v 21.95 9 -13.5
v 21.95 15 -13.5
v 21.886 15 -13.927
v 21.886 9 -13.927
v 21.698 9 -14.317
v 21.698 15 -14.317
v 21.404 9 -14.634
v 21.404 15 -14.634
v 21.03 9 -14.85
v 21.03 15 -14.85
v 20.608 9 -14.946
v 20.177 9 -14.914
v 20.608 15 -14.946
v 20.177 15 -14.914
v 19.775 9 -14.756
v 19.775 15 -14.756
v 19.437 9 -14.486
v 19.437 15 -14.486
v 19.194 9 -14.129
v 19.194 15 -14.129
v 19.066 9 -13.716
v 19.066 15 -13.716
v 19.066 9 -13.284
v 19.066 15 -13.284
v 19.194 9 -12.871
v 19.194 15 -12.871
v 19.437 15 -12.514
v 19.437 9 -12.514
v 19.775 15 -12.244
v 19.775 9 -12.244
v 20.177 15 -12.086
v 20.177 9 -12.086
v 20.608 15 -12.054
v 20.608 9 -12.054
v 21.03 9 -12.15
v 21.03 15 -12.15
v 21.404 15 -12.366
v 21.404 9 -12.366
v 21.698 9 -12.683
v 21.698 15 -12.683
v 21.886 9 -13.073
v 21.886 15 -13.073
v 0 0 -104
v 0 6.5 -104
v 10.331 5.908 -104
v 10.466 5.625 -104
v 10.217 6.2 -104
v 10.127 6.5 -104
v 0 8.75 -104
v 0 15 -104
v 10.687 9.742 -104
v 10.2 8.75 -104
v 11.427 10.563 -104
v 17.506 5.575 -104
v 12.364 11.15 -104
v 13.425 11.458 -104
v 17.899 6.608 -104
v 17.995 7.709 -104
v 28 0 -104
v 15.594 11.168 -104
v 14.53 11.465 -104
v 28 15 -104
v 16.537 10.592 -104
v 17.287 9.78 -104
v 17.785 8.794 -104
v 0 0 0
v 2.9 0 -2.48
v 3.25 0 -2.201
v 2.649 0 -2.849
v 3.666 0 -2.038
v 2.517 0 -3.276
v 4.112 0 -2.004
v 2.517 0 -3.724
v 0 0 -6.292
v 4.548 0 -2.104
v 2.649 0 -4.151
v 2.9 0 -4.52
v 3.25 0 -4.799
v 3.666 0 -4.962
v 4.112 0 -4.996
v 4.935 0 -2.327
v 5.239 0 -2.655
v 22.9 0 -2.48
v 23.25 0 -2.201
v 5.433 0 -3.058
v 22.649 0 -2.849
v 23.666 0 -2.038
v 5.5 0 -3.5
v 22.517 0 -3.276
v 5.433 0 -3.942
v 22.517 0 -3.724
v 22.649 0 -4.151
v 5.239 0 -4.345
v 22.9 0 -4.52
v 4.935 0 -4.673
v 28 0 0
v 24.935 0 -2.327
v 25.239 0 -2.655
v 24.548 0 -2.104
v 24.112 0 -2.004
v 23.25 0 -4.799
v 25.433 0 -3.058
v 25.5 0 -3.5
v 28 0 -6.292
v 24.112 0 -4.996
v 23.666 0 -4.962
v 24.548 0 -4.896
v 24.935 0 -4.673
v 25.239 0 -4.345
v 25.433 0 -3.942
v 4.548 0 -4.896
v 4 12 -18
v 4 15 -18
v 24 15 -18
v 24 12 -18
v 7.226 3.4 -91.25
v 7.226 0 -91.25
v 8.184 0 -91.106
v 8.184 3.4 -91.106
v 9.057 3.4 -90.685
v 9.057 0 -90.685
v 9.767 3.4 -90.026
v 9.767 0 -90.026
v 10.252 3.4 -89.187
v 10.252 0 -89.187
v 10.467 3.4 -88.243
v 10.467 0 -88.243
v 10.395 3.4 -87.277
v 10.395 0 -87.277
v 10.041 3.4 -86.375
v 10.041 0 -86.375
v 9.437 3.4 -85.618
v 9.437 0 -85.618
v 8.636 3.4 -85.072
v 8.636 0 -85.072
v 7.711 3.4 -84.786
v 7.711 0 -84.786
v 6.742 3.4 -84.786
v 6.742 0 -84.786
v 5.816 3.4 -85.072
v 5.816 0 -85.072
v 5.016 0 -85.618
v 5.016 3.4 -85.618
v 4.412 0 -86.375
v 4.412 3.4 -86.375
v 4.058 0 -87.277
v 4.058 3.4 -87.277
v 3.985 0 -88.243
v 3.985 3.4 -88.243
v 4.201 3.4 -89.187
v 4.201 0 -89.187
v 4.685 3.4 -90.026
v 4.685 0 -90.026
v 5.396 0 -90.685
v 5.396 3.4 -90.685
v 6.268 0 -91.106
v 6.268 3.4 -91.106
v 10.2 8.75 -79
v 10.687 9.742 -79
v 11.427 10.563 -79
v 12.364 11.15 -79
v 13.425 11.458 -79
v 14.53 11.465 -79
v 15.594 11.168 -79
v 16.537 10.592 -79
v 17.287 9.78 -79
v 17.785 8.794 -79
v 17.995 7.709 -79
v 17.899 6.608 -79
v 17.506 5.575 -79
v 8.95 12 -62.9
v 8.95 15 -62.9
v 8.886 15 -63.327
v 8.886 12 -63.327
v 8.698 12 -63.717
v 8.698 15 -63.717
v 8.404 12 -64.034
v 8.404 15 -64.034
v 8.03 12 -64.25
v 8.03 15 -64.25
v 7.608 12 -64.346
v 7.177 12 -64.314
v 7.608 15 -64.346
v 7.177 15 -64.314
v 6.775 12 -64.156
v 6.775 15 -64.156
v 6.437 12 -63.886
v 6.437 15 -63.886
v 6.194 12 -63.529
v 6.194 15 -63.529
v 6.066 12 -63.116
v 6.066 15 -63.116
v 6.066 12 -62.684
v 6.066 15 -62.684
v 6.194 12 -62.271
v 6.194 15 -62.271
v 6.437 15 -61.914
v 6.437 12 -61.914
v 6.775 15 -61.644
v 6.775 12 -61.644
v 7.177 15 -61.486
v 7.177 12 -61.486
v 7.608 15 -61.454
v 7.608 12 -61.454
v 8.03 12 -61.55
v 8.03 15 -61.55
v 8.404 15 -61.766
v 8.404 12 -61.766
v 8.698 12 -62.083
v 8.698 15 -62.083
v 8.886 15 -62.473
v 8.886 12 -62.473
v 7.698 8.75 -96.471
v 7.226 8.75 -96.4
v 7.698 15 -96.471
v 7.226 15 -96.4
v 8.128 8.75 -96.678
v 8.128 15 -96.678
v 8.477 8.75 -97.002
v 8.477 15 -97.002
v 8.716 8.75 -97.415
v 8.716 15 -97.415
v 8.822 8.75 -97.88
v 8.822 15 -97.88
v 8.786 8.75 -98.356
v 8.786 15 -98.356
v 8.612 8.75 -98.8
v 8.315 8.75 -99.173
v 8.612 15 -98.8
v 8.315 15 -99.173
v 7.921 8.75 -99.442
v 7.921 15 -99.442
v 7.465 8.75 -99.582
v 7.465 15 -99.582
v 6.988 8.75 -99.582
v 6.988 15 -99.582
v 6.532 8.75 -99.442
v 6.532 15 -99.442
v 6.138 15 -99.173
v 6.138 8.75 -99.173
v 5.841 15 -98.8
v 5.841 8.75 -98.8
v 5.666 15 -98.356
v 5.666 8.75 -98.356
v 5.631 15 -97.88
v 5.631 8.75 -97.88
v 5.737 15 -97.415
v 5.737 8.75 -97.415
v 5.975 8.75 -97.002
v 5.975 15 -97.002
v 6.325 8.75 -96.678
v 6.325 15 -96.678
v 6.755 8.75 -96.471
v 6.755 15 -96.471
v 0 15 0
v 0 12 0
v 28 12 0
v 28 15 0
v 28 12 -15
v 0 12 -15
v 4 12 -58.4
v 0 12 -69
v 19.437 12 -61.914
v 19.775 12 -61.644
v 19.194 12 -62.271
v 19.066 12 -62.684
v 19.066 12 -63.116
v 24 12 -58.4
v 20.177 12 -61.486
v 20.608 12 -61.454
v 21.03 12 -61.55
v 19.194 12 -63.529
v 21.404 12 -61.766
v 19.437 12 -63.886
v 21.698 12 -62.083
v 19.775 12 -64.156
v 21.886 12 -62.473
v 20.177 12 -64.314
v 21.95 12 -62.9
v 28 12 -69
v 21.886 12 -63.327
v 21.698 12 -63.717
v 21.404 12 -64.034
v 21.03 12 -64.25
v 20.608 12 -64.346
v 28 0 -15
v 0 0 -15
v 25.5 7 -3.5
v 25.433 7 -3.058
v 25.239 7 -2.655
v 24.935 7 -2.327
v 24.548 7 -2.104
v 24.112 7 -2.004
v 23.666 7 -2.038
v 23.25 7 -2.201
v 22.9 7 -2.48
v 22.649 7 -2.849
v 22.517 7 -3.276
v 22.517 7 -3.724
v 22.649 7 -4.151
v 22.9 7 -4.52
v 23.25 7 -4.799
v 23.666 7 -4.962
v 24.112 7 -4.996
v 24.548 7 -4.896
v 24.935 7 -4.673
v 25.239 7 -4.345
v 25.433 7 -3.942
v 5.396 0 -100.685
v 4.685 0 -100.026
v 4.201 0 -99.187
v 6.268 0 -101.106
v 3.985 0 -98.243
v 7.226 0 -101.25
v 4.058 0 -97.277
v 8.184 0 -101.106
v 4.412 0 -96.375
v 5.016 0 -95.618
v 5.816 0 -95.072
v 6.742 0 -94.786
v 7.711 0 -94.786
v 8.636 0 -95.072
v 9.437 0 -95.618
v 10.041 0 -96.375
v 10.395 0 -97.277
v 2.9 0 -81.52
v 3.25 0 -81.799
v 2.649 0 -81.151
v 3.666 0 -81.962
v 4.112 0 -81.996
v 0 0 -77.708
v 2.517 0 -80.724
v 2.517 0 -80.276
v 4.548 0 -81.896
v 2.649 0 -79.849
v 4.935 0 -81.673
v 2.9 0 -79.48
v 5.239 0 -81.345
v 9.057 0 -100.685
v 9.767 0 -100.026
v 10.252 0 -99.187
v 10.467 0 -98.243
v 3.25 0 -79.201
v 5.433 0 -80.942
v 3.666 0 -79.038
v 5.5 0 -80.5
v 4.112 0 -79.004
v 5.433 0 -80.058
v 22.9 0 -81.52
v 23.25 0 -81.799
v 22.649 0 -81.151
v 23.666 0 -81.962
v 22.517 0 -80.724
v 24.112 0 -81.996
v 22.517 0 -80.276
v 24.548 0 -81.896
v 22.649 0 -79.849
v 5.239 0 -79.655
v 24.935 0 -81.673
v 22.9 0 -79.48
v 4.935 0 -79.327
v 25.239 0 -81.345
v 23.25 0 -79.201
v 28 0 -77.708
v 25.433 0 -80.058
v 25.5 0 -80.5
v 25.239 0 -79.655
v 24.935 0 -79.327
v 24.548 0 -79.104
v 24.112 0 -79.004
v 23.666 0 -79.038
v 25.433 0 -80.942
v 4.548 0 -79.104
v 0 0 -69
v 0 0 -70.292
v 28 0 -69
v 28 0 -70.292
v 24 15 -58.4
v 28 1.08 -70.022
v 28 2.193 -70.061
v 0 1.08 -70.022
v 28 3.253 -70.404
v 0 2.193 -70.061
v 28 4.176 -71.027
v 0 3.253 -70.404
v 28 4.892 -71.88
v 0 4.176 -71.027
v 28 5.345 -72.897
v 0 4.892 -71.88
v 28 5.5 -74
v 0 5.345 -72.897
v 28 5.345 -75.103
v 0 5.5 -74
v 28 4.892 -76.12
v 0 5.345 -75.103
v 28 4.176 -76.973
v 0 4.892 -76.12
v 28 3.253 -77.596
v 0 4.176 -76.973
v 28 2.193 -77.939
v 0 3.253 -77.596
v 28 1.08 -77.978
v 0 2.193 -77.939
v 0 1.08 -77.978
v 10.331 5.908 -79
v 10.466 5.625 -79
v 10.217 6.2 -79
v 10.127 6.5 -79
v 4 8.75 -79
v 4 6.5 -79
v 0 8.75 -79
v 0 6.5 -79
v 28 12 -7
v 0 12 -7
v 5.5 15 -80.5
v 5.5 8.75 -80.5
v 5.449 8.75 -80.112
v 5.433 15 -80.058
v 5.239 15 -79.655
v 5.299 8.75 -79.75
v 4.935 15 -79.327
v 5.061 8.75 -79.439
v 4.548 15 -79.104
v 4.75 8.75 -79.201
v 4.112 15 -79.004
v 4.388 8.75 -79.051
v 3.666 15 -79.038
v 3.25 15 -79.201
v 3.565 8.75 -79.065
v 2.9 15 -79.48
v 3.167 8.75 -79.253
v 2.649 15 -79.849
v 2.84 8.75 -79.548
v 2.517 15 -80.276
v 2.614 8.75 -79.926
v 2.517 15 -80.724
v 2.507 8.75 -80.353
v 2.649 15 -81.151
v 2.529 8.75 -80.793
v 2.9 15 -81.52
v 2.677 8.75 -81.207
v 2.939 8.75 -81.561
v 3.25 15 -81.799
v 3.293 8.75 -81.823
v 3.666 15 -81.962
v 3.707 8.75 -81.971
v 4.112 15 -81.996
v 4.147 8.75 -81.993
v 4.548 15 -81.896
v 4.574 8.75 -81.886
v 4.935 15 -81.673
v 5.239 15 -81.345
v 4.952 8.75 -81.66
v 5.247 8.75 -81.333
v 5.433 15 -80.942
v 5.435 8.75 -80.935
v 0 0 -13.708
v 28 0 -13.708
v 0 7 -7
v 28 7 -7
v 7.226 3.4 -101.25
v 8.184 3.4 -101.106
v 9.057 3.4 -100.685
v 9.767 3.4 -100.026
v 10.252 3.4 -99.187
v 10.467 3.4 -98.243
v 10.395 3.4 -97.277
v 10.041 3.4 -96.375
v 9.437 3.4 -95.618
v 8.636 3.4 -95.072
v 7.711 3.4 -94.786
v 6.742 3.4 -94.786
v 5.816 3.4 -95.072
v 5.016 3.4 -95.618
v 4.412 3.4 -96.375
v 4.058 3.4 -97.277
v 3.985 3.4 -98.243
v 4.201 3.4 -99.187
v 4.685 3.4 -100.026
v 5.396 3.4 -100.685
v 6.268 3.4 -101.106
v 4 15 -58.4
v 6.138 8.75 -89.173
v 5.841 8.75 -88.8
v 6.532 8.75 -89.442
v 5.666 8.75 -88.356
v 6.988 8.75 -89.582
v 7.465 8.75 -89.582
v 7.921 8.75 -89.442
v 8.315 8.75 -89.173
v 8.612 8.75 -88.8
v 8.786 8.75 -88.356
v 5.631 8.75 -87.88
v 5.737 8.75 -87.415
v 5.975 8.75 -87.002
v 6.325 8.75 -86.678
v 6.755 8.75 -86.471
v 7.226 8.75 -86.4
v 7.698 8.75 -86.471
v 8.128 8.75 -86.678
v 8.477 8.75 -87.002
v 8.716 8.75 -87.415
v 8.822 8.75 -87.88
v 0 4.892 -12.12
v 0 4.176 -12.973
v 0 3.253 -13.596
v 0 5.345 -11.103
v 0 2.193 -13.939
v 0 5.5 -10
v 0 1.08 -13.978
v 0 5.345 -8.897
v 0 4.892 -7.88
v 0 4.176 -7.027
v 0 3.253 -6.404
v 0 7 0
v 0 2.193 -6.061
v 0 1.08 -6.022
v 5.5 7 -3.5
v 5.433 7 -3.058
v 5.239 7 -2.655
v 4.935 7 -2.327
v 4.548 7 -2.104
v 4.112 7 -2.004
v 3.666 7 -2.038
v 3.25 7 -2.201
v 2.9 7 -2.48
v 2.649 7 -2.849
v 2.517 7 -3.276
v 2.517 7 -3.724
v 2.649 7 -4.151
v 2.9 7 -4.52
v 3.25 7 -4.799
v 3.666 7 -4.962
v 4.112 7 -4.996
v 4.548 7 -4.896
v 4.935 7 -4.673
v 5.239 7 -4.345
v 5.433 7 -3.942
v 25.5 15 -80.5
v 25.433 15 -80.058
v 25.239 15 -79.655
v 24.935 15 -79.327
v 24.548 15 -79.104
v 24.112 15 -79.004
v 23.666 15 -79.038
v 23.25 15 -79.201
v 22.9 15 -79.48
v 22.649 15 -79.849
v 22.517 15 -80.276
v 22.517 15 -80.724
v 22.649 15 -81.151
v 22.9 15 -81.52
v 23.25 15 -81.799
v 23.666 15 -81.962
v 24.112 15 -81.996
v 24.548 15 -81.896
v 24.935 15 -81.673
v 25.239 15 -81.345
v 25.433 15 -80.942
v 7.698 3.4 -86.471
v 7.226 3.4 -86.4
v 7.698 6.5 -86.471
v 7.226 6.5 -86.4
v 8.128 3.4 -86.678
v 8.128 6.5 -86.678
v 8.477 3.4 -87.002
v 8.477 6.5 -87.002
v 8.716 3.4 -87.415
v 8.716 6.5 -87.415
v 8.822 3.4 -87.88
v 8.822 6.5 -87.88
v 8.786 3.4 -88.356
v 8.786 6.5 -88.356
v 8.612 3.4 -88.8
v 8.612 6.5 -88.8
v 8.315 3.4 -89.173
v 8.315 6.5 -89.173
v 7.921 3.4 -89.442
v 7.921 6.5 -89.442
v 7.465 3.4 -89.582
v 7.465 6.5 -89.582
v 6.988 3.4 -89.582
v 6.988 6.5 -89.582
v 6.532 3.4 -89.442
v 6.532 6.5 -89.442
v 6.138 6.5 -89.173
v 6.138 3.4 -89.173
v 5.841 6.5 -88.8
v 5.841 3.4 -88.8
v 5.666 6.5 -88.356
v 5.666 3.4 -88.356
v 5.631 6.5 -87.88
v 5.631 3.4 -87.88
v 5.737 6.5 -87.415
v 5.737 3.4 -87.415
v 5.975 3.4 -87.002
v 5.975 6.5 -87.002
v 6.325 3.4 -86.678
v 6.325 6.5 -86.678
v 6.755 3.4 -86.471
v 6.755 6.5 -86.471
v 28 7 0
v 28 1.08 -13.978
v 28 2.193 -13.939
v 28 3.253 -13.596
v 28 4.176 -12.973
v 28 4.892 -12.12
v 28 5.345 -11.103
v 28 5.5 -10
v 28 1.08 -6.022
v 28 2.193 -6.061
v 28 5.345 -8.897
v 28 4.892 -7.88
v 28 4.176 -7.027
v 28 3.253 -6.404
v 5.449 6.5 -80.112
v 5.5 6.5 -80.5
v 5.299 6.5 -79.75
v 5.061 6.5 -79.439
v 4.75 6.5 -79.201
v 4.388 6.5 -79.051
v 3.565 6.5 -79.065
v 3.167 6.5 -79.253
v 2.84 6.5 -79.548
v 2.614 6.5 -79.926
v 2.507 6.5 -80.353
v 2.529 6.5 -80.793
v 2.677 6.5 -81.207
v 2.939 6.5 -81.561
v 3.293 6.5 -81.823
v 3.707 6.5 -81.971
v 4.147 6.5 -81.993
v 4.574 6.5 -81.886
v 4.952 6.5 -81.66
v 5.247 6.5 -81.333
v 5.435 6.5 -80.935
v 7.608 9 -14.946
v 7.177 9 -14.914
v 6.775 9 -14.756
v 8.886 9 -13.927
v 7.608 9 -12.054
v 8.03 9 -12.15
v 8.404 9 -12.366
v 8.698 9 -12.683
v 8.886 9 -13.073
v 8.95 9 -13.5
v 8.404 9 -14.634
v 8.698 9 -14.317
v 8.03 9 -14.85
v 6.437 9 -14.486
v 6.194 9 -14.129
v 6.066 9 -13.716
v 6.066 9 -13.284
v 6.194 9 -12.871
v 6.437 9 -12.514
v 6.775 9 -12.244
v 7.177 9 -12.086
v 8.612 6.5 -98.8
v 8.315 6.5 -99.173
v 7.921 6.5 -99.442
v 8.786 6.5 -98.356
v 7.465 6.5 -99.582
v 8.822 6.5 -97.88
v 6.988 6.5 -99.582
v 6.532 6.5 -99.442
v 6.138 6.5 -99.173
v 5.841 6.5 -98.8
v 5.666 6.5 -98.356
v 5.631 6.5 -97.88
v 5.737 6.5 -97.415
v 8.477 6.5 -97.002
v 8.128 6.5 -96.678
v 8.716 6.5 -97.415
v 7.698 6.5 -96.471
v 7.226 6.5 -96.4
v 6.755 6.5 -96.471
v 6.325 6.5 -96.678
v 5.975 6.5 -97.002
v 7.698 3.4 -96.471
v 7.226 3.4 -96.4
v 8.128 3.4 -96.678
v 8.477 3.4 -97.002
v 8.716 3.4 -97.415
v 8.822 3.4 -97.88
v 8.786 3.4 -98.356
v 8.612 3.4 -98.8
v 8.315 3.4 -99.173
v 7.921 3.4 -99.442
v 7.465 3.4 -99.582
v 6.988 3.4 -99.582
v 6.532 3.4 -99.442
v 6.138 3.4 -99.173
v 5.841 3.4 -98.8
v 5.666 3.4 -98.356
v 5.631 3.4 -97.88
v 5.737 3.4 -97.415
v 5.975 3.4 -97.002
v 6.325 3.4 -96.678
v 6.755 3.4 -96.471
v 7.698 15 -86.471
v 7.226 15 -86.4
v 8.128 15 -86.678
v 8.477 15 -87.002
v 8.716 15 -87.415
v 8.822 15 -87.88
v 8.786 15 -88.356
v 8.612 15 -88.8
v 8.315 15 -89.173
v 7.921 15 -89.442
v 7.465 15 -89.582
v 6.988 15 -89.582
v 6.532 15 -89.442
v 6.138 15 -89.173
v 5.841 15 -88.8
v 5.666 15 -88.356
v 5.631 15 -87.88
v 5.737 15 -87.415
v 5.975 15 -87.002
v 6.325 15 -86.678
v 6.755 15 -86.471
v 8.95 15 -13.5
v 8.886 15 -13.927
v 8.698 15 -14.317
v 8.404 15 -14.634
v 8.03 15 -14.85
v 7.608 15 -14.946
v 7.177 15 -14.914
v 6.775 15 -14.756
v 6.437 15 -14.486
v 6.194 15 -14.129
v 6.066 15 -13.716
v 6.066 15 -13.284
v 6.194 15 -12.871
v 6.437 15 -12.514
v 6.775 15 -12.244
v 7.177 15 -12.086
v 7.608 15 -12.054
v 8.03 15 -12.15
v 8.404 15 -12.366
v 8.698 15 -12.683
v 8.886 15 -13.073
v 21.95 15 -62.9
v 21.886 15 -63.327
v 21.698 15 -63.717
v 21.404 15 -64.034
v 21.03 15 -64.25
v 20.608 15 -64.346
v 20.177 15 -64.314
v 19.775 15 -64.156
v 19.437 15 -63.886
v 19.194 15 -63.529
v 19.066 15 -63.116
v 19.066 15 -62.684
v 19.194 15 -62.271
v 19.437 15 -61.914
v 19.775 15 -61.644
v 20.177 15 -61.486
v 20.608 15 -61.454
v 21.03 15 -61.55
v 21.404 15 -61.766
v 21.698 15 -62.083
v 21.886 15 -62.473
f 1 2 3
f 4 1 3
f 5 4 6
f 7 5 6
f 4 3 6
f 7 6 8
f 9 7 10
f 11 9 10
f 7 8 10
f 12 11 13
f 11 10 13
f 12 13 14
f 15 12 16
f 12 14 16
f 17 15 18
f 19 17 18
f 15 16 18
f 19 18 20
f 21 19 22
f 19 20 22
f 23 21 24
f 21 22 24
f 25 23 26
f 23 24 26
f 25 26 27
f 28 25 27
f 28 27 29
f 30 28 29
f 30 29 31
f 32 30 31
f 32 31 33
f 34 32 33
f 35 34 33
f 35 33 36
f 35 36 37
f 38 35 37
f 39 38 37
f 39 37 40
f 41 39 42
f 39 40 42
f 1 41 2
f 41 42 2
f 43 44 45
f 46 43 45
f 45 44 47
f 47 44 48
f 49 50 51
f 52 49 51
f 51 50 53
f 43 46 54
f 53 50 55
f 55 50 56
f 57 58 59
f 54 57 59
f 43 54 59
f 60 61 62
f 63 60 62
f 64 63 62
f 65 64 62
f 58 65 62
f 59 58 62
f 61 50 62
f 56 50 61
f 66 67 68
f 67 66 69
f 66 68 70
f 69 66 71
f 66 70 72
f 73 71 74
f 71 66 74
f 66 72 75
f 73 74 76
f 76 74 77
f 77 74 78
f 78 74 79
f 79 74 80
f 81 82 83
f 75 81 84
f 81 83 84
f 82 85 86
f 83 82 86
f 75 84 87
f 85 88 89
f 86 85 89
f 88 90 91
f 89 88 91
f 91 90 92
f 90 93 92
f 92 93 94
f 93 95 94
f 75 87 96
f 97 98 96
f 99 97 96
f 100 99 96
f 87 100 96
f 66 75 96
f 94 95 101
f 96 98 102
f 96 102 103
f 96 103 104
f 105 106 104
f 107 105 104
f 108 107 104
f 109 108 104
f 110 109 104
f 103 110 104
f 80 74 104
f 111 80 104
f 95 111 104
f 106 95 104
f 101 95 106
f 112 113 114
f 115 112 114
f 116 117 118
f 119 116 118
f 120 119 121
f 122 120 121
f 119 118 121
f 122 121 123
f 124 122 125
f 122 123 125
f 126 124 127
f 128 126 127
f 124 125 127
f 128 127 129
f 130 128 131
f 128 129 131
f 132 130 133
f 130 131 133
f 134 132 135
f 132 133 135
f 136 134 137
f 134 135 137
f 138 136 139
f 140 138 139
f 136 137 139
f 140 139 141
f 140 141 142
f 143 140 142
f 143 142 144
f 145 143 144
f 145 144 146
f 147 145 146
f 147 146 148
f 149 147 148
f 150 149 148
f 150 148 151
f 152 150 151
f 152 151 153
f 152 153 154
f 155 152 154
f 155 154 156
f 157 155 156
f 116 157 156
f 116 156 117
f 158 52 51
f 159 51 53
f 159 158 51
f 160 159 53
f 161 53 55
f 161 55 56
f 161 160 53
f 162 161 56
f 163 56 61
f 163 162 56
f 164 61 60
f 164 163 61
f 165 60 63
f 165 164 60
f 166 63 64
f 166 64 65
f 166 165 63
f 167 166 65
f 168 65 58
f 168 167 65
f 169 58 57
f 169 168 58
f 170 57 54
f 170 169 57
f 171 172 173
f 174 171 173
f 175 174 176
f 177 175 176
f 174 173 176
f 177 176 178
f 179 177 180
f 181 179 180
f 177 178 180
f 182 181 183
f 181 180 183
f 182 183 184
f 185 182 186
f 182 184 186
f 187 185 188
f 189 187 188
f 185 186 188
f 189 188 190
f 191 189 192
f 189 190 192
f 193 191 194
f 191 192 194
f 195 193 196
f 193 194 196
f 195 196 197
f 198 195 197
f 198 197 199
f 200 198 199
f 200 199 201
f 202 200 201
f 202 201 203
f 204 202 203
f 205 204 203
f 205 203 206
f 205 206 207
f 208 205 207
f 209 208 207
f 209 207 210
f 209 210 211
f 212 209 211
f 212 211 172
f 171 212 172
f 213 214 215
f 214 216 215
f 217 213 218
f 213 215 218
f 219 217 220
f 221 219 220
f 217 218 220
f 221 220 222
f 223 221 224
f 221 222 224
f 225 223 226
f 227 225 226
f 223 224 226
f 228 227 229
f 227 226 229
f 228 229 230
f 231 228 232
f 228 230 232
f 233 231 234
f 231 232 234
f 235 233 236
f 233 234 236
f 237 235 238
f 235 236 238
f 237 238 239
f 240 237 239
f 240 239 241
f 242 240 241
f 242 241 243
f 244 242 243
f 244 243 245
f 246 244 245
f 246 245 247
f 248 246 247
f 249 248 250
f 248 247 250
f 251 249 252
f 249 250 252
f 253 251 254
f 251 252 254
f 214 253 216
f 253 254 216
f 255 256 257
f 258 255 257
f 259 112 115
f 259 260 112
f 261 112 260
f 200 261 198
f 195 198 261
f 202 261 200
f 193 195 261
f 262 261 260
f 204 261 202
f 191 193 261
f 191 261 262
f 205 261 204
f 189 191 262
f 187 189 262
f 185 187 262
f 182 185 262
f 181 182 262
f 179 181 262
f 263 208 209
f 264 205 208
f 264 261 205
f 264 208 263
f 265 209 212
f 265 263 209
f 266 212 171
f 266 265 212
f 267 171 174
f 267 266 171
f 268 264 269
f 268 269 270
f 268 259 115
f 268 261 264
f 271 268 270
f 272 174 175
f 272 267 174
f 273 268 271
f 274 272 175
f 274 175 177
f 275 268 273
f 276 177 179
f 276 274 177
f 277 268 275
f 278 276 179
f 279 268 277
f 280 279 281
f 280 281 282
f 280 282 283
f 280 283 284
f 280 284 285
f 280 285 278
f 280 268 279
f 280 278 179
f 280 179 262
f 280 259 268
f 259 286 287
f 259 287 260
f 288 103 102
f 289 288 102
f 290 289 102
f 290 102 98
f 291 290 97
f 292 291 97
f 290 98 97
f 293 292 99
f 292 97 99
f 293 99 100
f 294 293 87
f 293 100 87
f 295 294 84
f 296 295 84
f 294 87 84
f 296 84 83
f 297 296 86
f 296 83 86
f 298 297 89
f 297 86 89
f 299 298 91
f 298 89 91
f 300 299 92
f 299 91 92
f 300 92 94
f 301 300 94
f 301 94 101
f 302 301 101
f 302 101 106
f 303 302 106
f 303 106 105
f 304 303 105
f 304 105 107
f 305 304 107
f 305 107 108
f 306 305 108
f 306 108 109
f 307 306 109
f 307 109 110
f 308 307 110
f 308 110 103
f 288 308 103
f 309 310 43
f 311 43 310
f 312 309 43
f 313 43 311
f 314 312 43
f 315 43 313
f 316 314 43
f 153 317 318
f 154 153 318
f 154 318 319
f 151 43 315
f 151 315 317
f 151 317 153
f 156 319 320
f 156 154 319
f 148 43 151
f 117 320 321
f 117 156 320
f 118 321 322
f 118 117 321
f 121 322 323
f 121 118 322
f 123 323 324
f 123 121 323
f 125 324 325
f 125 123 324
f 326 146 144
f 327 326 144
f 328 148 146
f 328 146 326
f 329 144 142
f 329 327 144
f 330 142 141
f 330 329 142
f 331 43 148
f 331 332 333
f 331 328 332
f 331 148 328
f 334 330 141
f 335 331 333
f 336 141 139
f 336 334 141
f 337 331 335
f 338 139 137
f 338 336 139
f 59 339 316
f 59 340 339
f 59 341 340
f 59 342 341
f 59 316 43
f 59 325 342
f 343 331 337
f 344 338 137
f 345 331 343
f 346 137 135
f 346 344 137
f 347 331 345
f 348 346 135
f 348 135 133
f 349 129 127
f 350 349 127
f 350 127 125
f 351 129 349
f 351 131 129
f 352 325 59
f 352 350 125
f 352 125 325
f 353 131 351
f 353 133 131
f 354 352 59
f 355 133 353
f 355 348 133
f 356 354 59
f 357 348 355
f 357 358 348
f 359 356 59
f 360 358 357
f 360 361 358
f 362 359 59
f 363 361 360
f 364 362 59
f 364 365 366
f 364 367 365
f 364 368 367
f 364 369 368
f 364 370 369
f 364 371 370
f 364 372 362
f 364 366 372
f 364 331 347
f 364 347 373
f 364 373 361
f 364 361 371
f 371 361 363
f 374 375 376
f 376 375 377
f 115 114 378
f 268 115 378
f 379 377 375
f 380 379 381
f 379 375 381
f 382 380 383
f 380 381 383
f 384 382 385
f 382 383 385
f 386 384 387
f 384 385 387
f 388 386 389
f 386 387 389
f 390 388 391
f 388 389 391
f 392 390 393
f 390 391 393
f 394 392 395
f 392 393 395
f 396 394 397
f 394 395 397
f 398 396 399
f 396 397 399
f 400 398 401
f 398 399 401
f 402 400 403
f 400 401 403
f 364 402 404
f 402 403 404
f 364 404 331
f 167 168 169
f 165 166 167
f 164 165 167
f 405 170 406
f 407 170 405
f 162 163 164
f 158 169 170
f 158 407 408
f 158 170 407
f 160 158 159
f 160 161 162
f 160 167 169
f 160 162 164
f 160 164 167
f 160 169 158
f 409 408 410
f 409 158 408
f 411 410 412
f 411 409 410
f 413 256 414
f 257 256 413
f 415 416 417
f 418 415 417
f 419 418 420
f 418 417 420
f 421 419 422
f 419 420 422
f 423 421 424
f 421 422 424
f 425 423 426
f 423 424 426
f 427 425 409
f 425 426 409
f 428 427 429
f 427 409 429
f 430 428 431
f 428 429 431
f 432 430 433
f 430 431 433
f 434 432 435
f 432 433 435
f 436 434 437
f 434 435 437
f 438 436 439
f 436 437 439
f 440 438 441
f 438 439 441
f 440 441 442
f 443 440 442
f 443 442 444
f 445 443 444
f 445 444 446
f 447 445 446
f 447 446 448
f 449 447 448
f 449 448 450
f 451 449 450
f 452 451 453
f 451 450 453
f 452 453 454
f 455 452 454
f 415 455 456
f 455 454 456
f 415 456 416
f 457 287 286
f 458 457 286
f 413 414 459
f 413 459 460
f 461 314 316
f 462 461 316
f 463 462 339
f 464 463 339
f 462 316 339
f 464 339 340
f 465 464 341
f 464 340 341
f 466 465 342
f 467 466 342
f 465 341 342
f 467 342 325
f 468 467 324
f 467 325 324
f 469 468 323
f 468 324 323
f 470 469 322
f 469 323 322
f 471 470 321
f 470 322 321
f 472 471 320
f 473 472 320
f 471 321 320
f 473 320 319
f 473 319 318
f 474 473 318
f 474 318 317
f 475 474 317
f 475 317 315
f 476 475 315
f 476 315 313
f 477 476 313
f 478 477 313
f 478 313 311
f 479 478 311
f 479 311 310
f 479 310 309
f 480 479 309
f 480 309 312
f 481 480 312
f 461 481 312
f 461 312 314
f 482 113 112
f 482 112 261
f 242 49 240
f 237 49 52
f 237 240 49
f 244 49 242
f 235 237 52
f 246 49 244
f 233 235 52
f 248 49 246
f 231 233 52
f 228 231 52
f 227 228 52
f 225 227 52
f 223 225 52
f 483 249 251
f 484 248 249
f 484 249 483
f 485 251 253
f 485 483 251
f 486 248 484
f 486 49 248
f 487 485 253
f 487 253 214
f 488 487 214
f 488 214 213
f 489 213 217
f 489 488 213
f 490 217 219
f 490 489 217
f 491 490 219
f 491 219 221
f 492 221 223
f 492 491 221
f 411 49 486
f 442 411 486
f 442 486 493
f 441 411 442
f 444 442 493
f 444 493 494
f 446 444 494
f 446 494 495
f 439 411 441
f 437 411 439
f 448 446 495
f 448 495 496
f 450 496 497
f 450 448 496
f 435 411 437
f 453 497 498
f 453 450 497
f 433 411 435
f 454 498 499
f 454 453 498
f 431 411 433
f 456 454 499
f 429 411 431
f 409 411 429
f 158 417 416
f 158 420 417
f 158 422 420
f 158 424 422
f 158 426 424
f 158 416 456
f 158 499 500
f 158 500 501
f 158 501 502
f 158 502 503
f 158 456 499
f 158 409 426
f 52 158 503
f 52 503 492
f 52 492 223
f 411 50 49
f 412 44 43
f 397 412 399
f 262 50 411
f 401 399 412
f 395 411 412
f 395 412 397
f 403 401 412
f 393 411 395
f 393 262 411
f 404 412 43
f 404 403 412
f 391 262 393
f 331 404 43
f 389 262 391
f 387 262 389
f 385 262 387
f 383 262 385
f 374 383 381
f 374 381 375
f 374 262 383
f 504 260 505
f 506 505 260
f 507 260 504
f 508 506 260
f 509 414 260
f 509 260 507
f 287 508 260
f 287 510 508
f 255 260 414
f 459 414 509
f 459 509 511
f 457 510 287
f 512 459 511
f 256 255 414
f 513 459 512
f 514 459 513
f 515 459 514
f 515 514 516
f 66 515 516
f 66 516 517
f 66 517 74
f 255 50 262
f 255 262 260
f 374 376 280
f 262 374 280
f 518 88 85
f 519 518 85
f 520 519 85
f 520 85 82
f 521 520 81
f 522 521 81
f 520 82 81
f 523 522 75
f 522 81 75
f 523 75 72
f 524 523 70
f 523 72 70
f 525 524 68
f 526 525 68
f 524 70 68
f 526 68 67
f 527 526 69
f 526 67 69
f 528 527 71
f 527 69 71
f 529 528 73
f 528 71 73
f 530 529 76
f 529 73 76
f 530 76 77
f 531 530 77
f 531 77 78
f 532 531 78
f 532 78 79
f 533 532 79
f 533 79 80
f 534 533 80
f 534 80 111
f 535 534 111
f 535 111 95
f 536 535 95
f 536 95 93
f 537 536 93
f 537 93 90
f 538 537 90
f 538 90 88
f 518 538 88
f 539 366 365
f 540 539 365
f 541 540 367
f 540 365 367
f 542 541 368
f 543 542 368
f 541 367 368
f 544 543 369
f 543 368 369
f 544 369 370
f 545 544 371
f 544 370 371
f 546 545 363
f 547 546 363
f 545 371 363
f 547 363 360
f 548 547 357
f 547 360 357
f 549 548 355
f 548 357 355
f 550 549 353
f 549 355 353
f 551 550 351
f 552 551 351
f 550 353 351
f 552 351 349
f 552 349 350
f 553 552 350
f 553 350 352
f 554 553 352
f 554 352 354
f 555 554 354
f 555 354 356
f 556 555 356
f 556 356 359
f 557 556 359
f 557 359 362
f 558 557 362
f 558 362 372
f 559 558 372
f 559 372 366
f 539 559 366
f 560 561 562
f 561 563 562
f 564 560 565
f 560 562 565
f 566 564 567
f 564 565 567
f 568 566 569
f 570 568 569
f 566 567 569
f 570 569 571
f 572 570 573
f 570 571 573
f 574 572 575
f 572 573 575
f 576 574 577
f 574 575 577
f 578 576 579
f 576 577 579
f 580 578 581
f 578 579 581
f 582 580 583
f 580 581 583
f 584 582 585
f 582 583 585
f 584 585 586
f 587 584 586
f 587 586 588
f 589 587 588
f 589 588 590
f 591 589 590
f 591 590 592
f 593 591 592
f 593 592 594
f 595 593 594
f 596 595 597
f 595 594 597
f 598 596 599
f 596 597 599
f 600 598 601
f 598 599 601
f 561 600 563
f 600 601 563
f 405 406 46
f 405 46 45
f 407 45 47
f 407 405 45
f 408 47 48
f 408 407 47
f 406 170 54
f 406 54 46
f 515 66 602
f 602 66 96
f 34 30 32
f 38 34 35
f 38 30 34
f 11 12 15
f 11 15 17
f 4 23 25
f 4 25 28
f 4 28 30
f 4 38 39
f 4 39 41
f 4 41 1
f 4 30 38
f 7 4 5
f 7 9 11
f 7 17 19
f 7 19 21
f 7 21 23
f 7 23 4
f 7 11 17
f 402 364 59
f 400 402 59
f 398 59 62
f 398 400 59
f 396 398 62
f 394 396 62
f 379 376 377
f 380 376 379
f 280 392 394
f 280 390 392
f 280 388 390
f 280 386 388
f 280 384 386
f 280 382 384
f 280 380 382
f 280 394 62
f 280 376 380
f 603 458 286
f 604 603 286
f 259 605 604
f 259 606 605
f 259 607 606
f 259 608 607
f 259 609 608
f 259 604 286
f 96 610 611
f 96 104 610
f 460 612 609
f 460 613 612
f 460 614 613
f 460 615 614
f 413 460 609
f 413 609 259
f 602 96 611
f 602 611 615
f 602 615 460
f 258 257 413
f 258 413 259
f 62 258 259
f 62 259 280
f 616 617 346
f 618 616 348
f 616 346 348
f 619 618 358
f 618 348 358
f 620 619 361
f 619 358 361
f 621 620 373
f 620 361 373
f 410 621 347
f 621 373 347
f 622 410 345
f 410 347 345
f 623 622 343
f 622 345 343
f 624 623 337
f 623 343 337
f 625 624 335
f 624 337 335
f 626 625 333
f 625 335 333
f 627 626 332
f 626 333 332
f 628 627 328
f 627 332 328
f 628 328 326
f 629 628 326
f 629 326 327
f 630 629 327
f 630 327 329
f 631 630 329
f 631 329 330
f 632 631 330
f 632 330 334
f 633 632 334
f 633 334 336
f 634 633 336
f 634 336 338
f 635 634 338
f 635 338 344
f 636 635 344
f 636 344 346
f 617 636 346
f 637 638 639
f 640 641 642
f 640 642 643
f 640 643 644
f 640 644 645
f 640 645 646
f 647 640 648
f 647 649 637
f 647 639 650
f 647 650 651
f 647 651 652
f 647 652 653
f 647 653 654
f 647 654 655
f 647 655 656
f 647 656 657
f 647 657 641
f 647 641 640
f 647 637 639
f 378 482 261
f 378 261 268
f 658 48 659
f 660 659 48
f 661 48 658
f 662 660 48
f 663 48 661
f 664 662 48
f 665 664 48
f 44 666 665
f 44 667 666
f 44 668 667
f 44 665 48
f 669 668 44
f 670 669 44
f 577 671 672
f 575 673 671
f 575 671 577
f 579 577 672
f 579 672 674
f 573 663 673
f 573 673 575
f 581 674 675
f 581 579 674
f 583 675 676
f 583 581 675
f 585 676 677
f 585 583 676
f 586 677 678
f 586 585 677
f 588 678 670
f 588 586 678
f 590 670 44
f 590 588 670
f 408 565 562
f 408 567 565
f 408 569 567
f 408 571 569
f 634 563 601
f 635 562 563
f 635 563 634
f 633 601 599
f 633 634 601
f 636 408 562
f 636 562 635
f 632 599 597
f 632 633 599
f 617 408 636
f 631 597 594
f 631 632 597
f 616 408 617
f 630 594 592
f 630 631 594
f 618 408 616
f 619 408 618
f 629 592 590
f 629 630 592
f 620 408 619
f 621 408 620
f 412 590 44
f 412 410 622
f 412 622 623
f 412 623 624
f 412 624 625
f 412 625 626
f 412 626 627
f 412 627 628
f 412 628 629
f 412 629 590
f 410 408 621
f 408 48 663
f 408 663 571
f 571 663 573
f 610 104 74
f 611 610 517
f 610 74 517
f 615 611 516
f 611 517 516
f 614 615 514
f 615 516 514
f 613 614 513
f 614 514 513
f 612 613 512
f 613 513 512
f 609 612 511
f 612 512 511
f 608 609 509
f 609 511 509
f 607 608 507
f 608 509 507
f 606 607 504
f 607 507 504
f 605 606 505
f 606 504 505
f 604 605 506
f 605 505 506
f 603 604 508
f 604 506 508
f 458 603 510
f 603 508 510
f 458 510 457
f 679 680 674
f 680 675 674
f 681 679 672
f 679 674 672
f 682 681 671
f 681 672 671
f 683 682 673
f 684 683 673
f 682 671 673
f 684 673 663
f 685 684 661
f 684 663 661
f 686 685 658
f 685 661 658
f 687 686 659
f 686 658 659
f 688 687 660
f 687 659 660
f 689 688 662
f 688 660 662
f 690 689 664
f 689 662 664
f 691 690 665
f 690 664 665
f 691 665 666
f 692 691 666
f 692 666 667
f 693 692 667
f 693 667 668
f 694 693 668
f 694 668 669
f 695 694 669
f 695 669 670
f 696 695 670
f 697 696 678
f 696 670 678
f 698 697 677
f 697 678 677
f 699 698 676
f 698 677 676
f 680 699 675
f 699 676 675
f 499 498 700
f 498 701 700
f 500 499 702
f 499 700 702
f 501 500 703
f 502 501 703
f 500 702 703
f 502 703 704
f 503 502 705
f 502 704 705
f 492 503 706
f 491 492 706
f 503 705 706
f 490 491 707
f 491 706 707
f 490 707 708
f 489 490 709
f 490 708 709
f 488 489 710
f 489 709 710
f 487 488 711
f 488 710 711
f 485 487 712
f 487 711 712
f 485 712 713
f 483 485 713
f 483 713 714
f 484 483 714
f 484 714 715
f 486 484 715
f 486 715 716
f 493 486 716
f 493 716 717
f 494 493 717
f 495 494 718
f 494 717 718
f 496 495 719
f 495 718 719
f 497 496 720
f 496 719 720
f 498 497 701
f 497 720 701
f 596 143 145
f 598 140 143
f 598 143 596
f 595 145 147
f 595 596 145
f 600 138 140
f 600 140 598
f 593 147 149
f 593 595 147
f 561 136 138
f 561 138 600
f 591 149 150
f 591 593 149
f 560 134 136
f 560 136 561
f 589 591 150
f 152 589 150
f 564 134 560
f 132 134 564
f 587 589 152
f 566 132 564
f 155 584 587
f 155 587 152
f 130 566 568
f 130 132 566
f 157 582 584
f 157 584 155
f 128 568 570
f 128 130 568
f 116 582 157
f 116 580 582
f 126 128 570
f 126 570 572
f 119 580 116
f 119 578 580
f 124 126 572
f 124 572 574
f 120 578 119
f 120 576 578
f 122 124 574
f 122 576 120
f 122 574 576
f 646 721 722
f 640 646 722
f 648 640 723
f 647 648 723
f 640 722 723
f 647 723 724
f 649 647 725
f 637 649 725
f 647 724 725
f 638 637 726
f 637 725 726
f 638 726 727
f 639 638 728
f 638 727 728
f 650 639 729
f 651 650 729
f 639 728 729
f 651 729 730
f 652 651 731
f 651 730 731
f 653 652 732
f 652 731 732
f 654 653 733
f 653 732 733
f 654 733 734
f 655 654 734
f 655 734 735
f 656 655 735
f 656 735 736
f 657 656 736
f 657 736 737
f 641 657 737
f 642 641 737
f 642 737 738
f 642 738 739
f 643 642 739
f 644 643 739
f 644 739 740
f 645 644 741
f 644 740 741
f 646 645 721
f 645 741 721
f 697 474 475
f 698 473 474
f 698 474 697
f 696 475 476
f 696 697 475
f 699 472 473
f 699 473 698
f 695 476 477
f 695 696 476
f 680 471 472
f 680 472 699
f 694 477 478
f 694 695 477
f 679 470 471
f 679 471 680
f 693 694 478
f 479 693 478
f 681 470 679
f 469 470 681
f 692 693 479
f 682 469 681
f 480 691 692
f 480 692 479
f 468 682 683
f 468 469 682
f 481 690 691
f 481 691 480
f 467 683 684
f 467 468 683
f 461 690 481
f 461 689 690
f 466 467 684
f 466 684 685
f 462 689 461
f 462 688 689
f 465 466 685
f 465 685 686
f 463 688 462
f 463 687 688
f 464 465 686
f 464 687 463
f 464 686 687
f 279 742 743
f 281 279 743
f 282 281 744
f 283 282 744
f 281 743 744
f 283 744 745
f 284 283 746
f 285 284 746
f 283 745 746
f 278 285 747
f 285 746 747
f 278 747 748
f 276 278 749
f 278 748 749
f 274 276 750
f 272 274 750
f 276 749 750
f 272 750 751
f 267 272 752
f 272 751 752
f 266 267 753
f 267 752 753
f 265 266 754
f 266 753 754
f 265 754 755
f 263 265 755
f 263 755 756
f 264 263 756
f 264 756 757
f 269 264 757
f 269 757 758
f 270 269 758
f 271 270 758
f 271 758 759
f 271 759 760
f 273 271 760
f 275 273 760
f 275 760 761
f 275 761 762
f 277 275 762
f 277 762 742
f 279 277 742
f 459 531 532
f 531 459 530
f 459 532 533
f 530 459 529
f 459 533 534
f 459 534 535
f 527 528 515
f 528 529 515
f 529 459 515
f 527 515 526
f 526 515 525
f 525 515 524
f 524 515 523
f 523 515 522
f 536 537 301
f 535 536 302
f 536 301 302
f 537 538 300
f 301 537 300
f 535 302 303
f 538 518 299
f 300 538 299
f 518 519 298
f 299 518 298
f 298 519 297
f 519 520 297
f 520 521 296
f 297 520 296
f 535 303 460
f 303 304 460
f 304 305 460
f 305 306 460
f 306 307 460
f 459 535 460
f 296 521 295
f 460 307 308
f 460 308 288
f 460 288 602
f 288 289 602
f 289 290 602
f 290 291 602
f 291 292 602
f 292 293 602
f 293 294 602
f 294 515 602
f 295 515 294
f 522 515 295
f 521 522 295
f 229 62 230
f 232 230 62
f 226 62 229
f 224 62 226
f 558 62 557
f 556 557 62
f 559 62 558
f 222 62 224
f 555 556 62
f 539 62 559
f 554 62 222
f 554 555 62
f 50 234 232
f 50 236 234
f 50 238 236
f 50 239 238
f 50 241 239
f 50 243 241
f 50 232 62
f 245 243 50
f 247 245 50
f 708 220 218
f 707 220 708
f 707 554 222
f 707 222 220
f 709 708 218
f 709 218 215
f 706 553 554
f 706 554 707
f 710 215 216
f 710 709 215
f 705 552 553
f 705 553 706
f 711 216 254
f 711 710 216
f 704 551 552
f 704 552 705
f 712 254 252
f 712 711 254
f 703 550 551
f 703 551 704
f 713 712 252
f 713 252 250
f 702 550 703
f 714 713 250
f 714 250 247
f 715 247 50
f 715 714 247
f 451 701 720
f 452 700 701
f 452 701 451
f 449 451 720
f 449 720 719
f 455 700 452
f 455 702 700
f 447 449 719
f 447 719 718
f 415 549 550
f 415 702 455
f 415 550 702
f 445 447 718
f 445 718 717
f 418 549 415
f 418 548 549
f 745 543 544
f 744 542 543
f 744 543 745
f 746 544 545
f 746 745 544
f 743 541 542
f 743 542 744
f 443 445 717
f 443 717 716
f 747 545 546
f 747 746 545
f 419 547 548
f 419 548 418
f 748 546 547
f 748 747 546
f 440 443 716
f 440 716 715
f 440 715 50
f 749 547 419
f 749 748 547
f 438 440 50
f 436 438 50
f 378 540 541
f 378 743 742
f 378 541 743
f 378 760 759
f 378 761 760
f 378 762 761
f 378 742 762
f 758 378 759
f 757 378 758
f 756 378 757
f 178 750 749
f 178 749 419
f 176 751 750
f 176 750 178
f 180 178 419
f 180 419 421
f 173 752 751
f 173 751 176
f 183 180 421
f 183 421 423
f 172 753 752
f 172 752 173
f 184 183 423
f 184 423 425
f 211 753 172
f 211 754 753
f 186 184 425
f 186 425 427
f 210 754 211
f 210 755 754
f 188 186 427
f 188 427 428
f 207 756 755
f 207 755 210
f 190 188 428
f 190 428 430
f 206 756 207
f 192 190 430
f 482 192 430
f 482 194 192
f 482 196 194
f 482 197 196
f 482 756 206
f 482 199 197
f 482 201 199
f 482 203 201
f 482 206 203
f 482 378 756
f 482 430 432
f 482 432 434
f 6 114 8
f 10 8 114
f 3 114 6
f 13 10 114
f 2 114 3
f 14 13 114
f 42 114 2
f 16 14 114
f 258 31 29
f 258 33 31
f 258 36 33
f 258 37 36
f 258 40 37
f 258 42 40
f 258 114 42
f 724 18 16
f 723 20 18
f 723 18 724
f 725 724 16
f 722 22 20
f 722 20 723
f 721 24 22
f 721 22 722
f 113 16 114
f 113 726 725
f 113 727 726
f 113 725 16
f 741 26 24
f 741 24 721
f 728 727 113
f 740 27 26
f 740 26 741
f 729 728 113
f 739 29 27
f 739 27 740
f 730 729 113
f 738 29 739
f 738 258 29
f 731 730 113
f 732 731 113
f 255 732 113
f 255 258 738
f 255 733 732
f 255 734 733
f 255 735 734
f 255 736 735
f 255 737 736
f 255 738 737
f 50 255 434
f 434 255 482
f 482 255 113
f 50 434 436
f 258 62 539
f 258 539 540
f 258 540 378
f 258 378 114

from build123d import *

# Parameters (mm, degrees)
SKETCH1_W                                           = 28
SKETCH1_H                                           = 84
BOSS_EXTRUDE2_DEPTH                                 = 15
SKETCH7_W                                           = 54
SKETCH7_H                                           = 12
CUT_EXTRUDE2_DEPTH                                  = 1
CUT_EXTRUDE2_DEPTH_BACK                             = 29
SKETCH6_W                                           = 20
SKETCH6_H                                           = 40.4
CUT_EXTRUDE1_DEPTH                                  = 16
SKETCH8_W                                           = 28
SKETCH8_H                                           = 5
CUT_EXTRUDE3_DEPTH                                  = 7
SKETCH9_R                                           = 1.45
CUT_EXTRUDE4_DEPTH                                  = 6
SKETCH11_R                                          = 4
CUT_EXTRUDE5_DEPTH                                  = 1
CUT_EXTRUDE5_DEPTH_BACK                             = 29
SKETCH12_R                                          = 1.5
CUT_EXTRUDE6_DEPTH                                  = 8
SKETCH13_R                                          = 1.5
CUT_EXTRUDE7_DEPTH                                  = 16
BOSS_EXTRUDE3_DEPTH                                 = 20
CUT_EXTRUDE10_DEPTH                                 = 25
CBORE_FOR_M3_HEX_SOCKET_HEAD_CAP_SCREW1_D           = 3.2
CBORE_FOR_M3_HEX_SOCKET_HEAD_CAP_SCREW1_CBORE_D     = 6.5
CBORE_FOR_M3_HEX_SOCKET_HEAD_CAP_SCREW1_CBORE_DEPTH = 3.4


with BuildPart() as part:
    # Sketch1 → Boss-Extrude2 (new body)
    with BuildSketch(Plane(origin=(0, 0, 0), x_dir=(1, 0, 0), z_dir=(0, 1, 0))):
        with Locations((14, 42)):
            Rectangle(SKETCH1_W, SKETCH1_H)
    extrude(amount=BOSS_EXTRUDE2_DEPTH)

    # Sketch7 → Cut-Extrude2 (cut, two sides)
    with BuildSketch(Plane(origin=(28, 0, 0), x_dir=(0, 0, -1), z_dir=(1, 0, 0))) as cut_extrude2_sk:
        with Locations((42, 6)):
            Rectangle(SKETCH7_W, SKETCH7_H)
    extrude(amount=CUT_EXTRUDE2_DEPTH, mode=Mode.SUBTRACT)
    extrude(cut_extrude2_sk.sketch, amount=-CUT_EXTRUDE2_DEPTH_BACK, mode=Mode.SUBTRACT)

    # Sketch6 → Cut-Extrude1 (cut, through all)
    with BuildSketch(Plane(origin=(0, 15, 0), x_dir=(1, 0, 0), z_dir=(0, 1, 0))):
        with Locations((14, 38.2)):
            Rectangle(SKETCH6_W, SKETCH6_H)
    extrude(amount=-CUT_EXTRUDE1_DEPTH, mode=Mode.SUBTRACT)

    # Sketch8 → Cut-Extrude3 (cut)
    with BuildSketch(Plane.XY):
        with Locations((14, 9.5)):
            Rectangle(SKETCH8_W, SKETCH8_H)
    extrude(amount=-CUT_EXTRUDE3_DEPTH, mode=Mode.SUBTRACT)

    # Sketch9 → Cut-Extrude4 (cut)
    with BuildSketch(Plane(origin=(0, 15, 0), x_dir=(1, 0, 0), z_dir=(0, 1, 0))):
        with Locations((7.5, 13.5)):
            Circle(SKETCH9_R)
        with Locations((20.5, 13.5)):
            Circle(SKETCH9_R)
        with Locations((7.5, 62.9)):
            Circle(SKETCH9_R)
        with Locations((20.5, 62.9)):
            Circle(SKETCH9_R)
    extrude(amount=-CUT_EXTRUDE4_DEPTH, mode=Mode.SUBTRACT)

    # Sketch11 → Cut-Extrude5 (cut, two sides)
    with BuildSketch(Plane.ZY) as cut_extrude5_sk:
        with Locations((-10, 1.5)):
            Circle(SKETCH11_R)
        with Locations((-74, 1.5)):
            Circle(SKETCH11_R)
    extrude(amount=CUT_EXTRUDE5_DEPTH, mode=Mode.SUBTRACT)
    extrude(cut_extrude5_sk.sketch, amount=-CUT_EXTRUDE5_DEPTH_BACK, mode=Mode.SUBTRACT)

    # Sketch12 → Cut-Extrude6 (cut)
    with BuildSketch(Plane.XZ):
        with Locations((4, -3.5)):
            Circle(SKETCH12_R)
        with Locations((24, -3.5)):
            Circle(SKETCH12_R)
    extrude(amount=-CUT_EXTRUDE6_DEPTH, mode=Mode.SUBTRACT)

    # Sketch13 → Cut-Extrude7 (cut, through all)
    with BuildSketch(Plane.XZ):
        with Locations((4, -80.5)):
            Circle(SKETCH13_R)
        with Locations((24, -80.5)):
            Circle(SKETCH13_R)
    extrude(amount=-CUT_EXTRUDE7_DEPTH, mode=Mode.SUBTRACT)

    # Sketch15 → Boss-Extrude3 (add)
    with BuildSketch(Plane(origin=(0, 0, -84), x_dir=(-1, 0, 0), z_dir=(0, 0, -1))):
        with BuildLine():
            Line((-28, 15), (0, 15))
            Line((0, 15), (0, 8.75))
            Line((0, 8.75), (-10.200328962, 8.75))
            ThreePointArc((-10.200328962, 8.75), (-15.594420664, 11.168490527), (-17.506165925, 5.574694698))
            Line((-17.506165925, 5.574694698), (-10.466462197, 5.625403884))
            ThreePointArc((-10.466462197, 5.625403884), (-10.271009725, 6.05271581), (-10.127016654, 6.5))
            Line((-10.127016654, 6.5), (0, 6.5))
            Line((0, 6.5), (0, 0))
            Line((0, 0), (-28, 0))
            Line((-28, 0), (-28, 15))
        make_face()
    extrude(amount=BOSS_EXTRUDE3_DEPTH)

    # Sketch17 → Cut-Extrude10 (cut)
    with BuildSketch(Plane(origin=(0, 0, -104), x_dir=(-1, 0, 0), z_dir=(0, 0, -1))):
        with BuildLine():
            Line((0, 8.75), (-10.200328962, 8.75))
            ThreePointArc((-10.200328962, 8.75), (-15.594420664, 11.168490527), (-17.506165925, 5.574694698))
            Line((-17.506165925, 5.574694698), (-10.466462197, 5.625403884))
            ThreePointArc((-10.466462197, 5.625403884), (-10.271009725, 6.05271581), (-10.127016654, 6.5))
            Line((-10.127016654, 6.5), (0, 6.5))
            Line((0, 6.5), (0, 8.75))
        make_face()
    extrude(amount=-CUT_EXTRUDE10_DEPTH, mode=Mode.SUBTRACT)

    # CBORE for M3 Hex Socket Head Cap Screw1 (through all)
    with Locations(Plane(origin=(7.226315369, 0, -88), x_dir=(0, 0, -1), z_dir=(0, -1, 0))):
        with Locations((0, 0), (10, 0)):
            CounterBoreHole(CBORE_FOR_M3_HEX_SOCKET_HEAD_CAP_SCREW1_D / 2, CBORE_FOR_M3_HEX_SOCKET_HEAD_CAP_SCREW1_CBORE_D / 2, CBORE_FOR_M3_HEX_SOCKET_HEAD_CAP_SCREW1_CBORE_DEPTH)


solid = part.part
